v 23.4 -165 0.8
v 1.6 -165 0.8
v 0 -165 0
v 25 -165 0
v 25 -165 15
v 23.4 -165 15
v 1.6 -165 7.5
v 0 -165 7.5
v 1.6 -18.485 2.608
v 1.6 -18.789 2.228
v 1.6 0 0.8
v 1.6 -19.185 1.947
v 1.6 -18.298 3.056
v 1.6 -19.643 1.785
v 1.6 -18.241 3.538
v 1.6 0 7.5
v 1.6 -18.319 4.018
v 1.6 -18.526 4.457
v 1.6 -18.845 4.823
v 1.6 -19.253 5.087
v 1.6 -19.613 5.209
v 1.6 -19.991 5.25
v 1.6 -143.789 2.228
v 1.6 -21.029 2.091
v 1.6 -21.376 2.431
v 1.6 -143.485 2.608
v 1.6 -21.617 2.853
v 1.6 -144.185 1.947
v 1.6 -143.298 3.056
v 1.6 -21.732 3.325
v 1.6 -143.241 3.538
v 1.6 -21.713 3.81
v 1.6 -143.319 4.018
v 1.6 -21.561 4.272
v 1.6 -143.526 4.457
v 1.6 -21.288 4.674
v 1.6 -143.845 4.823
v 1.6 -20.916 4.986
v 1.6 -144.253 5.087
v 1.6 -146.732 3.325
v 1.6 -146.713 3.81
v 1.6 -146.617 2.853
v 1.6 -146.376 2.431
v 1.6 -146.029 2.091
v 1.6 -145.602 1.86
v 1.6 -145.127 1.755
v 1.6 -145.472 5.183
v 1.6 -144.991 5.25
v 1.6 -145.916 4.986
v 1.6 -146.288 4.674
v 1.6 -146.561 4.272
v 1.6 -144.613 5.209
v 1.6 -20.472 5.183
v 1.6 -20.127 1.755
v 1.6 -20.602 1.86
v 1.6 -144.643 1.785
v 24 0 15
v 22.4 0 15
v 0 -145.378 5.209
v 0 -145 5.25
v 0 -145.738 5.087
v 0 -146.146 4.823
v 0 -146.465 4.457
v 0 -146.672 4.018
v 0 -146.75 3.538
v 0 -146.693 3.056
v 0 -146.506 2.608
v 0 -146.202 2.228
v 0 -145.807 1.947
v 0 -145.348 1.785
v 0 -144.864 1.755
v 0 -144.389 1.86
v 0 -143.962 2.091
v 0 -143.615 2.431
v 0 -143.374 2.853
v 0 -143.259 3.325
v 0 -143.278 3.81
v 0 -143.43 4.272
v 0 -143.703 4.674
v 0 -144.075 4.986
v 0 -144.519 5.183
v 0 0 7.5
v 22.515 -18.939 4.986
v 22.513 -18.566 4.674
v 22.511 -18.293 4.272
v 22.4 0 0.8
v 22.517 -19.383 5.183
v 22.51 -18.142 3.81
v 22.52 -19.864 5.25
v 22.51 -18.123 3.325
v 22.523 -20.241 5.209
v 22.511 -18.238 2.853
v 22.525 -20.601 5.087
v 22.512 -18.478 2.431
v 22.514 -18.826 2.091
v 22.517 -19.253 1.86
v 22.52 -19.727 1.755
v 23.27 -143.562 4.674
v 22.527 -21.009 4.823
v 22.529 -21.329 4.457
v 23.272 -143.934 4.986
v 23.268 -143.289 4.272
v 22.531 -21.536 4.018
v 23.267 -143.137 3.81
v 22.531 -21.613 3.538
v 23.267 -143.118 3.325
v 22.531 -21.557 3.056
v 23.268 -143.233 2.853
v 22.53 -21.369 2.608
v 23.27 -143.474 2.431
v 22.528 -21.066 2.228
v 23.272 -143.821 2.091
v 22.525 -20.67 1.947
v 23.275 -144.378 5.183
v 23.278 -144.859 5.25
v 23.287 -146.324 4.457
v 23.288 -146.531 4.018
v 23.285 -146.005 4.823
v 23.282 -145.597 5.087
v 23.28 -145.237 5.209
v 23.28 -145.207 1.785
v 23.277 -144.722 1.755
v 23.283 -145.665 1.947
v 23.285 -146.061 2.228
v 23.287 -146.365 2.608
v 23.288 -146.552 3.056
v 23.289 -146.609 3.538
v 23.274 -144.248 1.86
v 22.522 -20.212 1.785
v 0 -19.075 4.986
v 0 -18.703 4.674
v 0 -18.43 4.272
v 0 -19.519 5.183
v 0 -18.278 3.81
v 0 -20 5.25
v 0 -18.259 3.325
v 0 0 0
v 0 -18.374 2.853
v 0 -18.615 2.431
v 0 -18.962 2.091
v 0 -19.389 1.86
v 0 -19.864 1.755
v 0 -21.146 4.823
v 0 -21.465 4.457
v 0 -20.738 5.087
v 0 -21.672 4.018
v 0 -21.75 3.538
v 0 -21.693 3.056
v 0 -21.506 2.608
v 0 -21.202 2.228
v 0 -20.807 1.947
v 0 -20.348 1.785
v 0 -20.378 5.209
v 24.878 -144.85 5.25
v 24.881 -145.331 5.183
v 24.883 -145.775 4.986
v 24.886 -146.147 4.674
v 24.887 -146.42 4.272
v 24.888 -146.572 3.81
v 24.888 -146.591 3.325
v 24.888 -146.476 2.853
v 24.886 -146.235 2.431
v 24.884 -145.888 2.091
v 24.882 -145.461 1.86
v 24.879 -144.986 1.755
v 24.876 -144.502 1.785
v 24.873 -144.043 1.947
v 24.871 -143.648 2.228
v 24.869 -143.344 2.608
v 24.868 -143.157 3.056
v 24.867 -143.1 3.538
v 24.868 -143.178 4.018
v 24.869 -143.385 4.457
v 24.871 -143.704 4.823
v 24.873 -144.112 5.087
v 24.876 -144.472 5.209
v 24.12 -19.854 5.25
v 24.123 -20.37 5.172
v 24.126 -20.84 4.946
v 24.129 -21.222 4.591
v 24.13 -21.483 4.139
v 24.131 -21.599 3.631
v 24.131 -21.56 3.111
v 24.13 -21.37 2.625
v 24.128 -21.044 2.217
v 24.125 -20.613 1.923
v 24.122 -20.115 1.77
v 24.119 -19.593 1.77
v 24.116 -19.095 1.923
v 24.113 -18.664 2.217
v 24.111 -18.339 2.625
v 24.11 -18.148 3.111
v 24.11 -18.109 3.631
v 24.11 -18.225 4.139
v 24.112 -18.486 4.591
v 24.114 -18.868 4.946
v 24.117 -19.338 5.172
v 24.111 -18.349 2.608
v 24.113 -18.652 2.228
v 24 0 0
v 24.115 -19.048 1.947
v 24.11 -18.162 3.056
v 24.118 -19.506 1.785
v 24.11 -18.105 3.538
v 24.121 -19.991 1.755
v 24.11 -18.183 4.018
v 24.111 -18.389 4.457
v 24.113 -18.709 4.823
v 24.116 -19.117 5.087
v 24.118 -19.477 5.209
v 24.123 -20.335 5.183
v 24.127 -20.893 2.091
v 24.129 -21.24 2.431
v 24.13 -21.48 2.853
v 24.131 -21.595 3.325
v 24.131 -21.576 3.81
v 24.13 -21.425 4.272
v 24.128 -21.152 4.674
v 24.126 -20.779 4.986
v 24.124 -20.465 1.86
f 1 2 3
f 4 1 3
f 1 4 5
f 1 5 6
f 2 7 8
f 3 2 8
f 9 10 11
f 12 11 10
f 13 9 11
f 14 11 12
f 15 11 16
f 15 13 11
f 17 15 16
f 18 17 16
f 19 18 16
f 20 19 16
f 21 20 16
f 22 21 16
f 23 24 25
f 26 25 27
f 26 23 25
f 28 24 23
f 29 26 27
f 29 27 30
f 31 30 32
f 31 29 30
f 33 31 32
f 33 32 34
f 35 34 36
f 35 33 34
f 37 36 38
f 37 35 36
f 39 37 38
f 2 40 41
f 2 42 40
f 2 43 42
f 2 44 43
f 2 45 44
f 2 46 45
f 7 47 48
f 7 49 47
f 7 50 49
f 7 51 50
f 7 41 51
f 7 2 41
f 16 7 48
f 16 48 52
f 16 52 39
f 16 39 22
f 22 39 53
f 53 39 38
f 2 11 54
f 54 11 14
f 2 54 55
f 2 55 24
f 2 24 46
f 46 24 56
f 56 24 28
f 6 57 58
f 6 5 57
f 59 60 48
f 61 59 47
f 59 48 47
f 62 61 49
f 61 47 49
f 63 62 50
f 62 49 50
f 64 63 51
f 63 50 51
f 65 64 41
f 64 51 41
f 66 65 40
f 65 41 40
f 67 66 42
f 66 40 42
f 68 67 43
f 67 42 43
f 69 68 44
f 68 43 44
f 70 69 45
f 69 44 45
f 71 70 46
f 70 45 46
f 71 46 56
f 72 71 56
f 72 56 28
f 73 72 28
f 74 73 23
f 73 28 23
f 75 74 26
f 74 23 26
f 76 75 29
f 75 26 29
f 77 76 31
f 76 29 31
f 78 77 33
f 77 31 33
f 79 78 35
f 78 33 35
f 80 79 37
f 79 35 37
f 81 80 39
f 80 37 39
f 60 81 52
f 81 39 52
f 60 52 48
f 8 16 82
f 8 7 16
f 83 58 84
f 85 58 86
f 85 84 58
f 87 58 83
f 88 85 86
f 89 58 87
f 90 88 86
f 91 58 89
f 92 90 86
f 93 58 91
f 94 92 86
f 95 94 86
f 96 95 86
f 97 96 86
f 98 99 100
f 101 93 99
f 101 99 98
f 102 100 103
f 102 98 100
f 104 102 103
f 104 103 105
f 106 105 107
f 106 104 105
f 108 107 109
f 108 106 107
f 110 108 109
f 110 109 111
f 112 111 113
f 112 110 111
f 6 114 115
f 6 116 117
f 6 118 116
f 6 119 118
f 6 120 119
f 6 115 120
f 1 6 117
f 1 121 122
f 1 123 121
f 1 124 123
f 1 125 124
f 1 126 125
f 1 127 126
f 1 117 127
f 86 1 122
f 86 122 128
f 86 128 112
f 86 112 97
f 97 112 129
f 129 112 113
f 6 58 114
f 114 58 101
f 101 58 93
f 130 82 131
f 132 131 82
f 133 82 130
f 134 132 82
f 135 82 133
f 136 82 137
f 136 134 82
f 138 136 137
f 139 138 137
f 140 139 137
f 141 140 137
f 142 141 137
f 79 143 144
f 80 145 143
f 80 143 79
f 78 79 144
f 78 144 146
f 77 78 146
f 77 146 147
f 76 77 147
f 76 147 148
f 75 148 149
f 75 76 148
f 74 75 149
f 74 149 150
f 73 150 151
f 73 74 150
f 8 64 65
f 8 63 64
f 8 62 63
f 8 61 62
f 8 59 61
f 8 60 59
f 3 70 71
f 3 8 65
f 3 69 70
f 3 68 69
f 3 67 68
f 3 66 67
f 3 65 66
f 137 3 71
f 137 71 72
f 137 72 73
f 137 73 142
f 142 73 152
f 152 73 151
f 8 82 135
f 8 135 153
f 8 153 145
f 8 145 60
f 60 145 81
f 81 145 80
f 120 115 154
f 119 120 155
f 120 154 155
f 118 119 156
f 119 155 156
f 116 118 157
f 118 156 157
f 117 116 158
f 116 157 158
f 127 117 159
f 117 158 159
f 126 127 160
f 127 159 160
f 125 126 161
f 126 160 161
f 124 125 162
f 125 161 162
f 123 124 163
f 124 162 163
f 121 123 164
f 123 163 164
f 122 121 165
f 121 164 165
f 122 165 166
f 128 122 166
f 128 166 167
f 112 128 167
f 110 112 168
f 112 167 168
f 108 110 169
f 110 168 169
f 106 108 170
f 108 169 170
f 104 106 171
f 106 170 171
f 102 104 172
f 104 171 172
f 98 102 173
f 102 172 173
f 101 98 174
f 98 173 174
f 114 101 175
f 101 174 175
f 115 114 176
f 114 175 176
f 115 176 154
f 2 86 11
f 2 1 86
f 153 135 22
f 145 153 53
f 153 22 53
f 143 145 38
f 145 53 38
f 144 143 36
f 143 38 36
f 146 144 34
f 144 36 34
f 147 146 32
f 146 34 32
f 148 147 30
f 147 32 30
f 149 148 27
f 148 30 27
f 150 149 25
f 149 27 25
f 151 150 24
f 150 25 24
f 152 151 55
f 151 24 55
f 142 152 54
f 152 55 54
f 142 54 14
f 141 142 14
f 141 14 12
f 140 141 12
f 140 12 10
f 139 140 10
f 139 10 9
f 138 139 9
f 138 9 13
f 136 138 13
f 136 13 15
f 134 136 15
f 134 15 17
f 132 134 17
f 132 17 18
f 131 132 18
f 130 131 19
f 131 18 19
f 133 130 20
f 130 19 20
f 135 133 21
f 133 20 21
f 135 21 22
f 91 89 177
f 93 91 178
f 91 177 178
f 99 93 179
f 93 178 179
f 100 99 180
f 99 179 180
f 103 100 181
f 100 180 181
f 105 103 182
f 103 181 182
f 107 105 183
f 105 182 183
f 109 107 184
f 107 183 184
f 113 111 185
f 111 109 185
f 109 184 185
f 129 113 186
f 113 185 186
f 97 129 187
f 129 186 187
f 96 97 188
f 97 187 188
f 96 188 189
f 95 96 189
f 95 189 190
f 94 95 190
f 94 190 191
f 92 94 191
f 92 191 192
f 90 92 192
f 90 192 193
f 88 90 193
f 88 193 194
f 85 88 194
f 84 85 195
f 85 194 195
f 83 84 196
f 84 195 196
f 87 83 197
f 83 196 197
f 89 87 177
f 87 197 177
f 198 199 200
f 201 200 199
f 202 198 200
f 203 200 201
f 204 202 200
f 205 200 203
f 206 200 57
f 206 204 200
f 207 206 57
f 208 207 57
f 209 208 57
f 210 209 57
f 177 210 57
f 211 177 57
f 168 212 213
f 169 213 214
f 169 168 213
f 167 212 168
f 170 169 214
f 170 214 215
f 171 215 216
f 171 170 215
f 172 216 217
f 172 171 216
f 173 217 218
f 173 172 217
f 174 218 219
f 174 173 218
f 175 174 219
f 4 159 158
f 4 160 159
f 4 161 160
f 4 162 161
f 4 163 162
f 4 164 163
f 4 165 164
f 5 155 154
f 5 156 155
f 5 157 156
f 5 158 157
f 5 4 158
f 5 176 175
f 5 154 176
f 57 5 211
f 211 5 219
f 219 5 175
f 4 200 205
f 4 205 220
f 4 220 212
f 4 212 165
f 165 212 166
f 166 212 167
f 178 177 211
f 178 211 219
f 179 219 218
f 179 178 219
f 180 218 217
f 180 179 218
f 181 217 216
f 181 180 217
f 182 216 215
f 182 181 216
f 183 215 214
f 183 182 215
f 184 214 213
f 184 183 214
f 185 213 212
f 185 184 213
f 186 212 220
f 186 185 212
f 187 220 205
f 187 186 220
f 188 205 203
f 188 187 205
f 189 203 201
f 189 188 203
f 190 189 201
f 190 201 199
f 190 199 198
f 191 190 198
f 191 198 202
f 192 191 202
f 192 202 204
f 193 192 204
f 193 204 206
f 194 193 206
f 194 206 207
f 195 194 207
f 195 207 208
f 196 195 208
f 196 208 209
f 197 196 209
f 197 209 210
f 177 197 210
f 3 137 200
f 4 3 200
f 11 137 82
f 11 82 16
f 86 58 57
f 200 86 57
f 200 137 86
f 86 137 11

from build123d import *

# Parameters (mm, degrees)
SKETCH002_R         = 1.75
POCKET_DEPTH        = 25.000541
POCKET_DEPTH_BACK   = 1.000982
LINEARPATTERN_COUNT = 2
LINEARPATTERN_PITCH = 125


with BuildPart() as part:
    # Sketch → AdditiveLoft section 0
    with BuildSketch(Plane.XZ):
        Polygon((0, 0), (24, 0), (24, 15), (22.4, 15), (22.4, 0.8), (1.6, 0.8), (1.6, 7.5), (0, 7.5), align=None)
    # Sketch001 (on DatumPlane) → AdditiveLoft section 1
    with BuildSketch(Plane.XZ.offset(165)):
        Polygon((0, 0), (0, 7.5), (1.6, 7.5), (1.6, 0.8), (23.4, 0.8), (23.4, 15), (25, 15), (25, 0), align=None)
    loft()

    # Sketch002 (on Face4 of AdditiveLoft) → Pocket (cut, two sides)
    with BuildSketch(Plane(origin=(23.999118, 0.145449, 0), x_dir=(0, 0, 1), z_dir=(0.999982, 0.00606, 0))) as pocket_sk:
        with Locations((3.5, 20)):
            Circle(SKETCH002_R)
    pocket = extrude(amount=-POCKET_DEPTH, mode=Mode.SUBTRACT) + extrude(pocket_sk.sketch, amount=POCKET_DEPTH_BACK, mode=Mode.SUBTRACT)

    # LinearPattern: Pocket ×2
    with Locations(*[(0, -i * LINEARPATTERN_PITCH, 0) for i in range(1, LINEARPATTERN_COUNT)]):
        add(pocket, mode=Mode.SUBTRACT)


solid = part.part
